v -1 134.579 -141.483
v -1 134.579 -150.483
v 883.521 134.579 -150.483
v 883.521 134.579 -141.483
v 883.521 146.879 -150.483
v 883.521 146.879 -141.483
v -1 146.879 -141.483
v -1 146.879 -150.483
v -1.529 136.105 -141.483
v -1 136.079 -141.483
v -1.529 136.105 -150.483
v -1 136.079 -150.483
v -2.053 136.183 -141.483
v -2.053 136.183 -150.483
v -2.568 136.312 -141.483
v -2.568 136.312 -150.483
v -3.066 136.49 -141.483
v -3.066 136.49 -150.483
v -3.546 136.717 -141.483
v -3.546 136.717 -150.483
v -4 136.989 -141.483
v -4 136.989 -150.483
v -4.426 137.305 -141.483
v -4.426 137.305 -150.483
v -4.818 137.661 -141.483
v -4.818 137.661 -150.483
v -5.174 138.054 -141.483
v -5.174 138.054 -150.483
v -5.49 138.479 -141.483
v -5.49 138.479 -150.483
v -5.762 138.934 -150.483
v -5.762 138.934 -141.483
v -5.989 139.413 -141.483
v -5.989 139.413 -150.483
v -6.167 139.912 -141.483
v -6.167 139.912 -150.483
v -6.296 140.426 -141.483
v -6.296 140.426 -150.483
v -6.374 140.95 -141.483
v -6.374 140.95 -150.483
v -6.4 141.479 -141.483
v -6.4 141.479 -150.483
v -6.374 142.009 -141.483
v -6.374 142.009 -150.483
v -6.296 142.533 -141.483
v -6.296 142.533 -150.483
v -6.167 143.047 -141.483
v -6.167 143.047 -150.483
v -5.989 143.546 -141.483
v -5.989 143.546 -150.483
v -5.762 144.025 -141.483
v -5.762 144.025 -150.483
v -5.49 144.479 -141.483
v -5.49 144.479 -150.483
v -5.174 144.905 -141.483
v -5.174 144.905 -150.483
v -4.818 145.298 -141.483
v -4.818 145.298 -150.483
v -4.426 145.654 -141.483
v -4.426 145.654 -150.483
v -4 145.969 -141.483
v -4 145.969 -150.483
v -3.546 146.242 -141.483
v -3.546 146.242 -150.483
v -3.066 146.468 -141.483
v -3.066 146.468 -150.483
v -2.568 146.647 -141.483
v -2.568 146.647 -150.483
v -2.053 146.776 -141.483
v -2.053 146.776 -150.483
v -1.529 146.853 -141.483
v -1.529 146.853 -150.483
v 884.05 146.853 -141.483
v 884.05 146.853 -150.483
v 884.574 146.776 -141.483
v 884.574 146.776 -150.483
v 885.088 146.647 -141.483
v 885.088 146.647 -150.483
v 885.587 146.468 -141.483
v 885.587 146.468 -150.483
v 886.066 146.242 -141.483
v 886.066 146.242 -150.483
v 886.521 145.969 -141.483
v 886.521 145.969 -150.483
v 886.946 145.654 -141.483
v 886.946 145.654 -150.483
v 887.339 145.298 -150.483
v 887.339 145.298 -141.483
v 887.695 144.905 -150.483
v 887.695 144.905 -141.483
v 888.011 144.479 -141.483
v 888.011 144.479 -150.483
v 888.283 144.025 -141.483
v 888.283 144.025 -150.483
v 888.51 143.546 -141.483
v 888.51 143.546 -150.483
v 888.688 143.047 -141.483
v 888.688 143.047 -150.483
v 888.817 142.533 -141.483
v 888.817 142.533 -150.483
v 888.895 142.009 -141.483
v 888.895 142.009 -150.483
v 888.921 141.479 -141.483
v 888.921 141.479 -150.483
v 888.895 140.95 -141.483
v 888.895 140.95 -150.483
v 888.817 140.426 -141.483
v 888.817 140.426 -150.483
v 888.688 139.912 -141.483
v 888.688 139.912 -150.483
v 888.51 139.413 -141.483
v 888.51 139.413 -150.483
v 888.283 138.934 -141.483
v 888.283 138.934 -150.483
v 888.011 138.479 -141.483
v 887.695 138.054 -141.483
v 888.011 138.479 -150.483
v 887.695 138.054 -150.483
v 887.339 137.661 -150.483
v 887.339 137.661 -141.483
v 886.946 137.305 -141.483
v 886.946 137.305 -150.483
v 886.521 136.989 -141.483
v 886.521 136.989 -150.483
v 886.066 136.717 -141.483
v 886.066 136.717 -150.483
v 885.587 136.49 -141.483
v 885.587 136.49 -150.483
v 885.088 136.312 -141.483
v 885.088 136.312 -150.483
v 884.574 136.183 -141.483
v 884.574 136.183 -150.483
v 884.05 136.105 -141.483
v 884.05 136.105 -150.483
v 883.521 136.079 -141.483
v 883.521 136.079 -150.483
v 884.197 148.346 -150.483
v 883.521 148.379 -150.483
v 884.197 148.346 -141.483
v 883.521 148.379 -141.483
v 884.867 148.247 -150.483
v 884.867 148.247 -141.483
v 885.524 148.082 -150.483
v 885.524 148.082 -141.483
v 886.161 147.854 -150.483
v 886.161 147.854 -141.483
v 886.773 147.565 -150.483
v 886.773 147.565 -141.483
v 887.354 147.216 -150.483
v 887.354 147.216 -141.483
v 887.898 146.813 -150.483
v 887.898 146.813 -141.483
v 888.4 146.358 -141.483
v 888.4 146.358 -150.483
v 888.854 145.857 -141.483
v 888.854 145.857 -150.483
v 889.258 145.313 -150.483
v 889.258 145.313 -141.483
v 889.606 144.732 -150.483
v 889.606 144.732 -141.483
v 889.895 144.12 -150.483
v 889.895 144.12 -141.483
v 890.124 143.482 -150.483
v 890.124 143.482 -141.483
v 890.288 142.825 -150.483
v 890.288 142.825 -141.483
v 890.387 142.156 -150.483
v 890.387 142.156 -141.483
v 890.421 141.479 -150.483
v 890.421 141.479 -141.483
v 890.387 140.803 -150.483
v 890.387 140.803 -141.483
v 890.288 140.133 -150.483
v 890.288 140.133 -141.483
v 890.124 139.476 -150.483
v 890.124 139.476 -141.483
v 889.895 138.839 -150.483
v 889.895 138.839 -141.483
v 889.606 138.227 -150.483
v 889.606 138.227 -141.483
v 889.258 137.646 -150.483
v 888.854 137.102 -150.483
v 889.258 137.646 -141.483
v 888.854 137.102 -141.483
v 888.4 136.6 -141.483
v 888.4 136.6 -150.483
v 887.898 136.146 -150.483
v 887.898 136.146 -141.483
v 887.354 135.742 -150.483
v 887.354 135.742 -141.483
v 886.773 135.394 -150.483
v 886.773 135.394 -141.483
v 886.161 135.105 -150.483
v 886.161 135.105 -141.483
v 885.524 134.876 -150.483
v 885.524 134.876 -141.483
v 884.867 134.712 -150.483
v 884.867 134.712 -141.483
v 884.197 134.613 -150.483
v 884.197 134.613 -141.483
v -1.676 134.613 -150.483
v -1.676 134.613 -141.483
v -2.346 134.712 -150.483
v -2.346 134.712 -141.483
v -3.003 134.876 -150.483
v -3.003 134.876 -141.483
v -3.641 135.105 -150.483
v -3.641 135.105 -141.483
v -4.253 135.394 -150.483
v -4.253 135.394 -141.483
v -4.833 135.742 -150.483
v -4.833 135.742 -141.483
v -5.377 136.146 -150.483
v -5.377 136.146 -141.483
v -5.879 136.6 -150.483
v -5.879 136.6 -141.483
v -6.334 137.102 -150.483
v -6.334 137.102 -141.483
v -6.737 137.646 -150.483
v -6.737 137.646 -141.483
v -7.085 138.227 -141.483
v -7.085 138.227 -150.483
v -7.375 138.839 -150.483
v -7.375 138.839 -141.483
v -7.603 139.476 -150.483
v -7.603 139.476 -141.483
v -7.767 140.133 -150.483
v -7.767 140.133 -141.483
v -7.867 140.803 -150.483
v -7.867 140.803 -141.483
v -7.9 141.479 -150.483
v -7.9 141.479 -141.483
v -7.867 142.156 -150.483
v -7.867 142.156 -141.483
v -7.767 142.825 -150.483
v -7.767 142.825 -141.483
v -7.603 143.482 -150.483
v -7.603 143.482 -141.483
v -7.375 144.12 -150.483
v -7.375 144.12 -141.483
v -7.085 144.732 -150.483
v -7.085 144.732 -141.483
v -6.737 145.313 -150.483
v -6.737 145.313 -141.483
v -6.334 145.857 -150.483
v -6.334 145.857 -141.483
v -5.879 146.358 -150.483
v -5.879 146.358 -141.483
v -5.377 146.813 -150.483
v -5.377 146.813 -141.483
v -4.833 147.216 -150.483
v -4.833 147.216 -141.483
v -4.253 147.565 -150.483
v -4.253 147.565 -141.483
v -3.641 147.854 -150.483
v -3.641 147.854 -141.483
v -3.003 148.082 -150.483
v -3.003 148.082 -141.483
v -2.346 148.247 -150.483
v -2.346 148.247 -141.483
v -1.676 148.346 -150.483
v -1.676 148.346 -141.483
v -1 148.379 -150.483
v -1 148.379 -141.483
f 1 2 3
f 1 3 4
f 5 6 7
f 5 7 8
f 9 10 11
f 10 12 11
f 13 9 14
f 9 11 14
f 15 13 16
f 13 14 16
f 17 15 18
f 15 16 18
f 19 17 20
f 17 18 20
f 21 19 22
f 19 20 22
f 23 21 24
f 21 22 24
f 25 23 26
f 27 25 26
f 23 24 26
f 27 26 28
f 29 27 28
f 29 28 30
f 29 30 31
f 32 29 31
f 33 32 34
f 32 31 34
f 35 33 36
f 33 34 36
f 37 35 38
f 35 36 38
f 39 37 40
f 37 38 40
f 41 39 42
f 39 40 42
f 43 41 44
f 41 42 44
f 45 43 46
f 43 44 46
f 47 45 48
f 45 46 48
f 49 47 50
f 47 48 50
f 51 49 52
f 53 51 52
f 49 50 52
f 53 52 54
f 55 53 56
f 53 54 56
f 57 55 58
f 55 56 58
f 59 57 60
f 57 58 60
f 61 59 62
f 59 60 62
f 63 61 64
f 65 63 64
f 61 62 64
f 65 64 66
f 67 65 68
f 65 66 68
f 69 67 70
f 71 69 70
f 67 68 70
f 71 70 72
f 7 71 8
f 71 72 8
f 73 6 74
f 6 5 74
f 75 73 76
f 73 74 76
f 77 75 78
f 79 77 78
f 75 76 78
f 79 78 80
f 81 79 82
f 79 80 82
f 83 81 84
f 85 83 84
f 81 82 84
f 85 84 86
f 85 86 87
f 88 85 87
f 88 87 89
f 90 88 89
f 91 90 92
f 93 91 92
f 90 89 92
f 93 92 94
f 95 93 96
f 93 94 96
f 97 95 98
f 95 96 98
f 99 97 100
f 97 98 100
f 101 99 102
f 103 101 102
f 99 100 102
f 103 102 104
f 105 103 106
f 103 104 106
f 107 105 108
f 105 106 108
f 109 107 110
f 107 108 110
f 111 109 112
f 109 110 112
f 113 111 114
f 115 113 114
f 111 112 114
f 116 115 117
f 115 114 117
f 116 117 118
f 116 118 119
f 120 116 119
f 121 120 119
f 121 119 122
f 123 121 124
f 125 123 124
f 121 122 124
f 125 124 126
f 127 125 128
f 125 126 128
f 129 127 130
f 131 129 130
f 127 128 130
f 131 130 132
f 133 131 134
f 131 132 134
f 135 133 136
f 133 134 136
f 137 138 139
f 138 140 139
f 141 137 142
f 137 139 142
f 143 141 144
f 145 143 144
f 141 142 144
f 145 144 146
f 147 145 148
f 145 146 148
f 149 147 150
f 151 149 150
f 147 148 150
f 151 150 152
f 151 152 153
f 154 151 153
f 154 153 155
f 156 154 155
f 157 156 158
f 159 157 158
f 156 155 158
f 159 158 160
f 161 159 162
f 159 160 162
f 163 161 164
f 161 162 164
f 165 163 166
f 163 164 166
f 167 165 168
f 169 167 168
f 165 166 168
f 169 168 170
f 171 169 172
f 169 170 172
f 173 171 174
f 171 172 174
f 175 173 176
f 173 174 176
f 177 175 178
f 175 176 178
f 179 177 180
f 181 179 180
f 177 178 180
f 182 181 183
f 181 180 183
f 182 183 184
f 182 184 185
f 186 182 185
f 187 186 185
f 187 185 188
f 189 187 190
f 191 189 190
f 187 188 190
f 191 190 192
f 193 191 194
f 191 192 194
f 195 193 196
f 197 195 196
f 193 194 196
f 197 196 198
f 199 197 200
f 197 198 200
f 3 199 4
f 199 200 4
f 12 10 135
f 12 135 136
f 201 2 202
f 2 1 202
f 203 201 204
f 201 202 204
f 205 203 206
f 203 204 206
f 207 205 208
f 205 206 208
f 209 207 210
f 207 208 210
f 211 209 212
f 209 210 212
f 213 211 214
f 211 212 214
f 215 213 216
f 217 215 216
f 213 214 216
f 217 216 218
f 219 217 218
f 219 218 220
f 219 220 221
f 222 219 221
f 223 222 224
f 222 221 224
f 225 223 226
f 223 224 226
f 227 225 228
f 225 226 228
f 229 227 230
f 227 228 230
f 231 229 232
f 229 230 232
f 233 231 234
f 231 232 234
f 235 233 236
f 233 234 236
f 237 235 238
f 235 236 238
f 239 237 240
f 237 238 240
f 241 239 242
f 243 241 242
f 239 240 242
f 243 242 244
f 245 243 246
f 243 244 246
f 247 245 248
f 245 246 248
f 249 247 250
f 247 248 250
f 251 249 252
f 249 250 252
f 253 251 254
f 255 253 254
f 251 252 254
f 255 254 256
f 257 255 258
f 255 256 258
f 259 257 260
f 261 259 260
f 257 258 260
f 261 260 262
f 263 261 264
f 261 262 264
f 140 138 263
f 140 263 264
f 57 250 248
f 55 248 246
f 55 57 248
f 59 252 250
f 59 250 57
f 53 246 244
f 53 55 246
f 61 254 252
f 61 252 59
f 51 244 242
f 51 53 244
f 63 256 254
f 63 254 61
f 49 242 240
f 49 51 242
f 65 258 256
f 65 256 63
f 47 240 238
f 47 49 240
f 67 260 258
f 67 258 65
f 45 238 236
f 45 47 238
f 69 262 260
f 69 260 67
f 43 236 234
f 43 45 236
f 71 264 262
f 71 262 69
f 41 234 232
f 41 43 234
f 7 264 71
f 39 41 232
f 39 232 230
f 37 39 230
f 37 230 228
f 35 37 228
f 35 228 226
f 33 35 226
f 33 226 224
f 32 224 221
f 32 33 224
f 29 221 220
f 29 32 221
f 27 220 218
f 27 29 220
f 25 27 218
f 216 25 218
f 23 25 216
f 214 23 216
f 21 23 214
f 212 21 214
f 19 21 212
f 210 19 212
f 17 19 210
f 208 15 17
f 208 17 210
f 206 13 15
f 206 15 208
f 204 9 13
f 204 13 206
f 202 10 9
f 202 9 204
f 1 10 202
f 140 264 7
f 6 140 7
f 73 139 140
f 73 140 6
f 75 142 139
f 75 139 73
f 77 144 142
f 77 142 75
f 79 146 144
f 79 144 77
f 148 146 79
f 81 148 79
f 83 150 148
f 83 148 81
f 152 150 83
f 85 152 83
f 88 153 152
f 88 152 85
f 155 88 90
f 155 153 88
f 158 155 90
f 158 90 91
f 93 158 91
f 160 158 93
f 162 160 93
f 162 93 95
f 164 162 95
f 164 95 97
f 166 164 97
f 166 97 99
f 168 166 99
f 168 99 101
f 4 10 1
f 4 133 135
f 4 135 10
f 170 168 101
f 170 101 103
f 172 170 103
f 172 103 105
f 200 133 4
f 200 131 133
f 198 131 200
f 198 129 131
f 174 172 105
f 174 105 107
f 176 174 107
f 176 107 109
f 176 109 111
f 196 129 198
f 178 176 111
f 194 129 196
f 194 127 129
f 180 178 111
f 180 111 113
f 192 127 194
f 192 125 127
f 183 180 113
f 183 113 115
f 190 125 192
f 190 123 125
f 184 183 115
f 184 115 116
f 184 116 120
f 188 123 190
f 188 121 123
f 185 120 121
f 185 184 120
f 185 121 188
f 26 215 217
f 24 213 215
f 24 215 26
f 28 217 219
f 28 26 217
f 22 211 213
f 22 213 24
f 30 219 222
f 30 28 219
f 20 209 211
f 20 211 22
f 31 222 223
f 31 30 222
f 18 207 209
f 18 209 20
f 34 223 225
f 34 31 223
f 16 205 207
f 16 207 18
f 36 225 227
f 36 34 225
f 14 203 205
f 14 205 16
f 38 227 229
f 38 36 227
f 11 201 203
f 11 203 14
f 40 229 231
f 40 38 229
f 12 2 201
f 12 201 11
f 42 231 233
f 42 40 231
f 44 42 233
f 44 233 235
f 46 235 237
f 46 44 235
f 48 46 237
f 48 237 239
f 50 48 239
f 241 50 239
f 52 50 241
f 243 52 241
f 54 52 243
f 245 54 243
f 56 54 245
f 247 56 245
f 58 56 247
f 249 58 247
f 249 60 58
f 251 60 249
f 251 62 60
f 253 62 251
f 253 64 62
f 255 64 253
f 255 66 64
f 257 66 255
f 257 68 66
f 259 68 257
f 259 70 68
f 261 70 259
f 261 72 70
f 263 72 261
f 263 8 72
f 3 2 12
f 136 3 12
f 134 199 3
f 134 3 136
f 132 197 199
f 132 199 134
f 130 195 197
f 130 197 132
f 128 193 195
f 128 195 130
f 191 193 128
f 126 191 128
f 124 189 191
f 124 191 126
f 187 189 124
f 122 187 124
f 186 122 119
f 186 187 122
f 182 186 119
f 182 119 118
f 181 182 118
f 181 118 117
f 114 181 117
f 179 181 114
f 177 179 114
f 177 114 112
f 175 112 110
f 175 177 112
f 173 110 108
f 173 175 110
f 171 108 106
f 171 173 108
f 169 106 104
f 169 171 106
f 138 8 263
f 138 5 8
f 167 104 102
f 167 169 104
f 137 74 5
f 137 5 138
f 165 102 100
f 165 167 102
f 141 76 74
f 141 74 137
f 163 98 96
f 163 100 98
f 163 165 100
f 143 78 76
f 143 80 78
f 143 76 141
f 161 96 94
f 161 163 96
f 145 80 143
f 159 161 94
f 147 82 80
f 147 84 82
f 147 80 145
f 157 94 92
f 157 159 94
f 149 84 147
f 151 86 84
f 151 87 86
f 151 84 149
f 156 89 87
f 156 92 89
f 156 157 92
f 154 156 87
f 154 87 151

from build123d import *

# Parameters (mm, degrees)
SKETCH3_W = 9
SKETCH3_H = 1.5


with BuildPart() as part:
    # Sweep1: sweep along a path in Sketch2
    with BuildLine(Plane.XY.offset(-150.483366658)) as sweep1_path:
        Line((-1, 148.379342702), (883.52063783, 148.379342702))
        ThreePointArc((883.52063783, 148.379342702), (890.42063783, 141.479342703), (883.52063783, 134.579342702))
        Line((883.52063783, 134.579342702), (-1, 134.579342702))
        ThreePointArc((-1, 134.579342702), (-7.9, 141.479342702), (-1, 148.379342702))
    # Sketch3 → Sweep1 (sweep)
    with BuildSketch(Plane(origin=(0, 0, 0), x_dir=(0, 0, -1), z_dir=(1, 0, 0))):
        with Locations((145.983366658, 147.629342702)):
            Rectangle(SKETCH3_W, SKETCH3_H)
    sweep(path=sweep1_path.line)


solid = part.part
